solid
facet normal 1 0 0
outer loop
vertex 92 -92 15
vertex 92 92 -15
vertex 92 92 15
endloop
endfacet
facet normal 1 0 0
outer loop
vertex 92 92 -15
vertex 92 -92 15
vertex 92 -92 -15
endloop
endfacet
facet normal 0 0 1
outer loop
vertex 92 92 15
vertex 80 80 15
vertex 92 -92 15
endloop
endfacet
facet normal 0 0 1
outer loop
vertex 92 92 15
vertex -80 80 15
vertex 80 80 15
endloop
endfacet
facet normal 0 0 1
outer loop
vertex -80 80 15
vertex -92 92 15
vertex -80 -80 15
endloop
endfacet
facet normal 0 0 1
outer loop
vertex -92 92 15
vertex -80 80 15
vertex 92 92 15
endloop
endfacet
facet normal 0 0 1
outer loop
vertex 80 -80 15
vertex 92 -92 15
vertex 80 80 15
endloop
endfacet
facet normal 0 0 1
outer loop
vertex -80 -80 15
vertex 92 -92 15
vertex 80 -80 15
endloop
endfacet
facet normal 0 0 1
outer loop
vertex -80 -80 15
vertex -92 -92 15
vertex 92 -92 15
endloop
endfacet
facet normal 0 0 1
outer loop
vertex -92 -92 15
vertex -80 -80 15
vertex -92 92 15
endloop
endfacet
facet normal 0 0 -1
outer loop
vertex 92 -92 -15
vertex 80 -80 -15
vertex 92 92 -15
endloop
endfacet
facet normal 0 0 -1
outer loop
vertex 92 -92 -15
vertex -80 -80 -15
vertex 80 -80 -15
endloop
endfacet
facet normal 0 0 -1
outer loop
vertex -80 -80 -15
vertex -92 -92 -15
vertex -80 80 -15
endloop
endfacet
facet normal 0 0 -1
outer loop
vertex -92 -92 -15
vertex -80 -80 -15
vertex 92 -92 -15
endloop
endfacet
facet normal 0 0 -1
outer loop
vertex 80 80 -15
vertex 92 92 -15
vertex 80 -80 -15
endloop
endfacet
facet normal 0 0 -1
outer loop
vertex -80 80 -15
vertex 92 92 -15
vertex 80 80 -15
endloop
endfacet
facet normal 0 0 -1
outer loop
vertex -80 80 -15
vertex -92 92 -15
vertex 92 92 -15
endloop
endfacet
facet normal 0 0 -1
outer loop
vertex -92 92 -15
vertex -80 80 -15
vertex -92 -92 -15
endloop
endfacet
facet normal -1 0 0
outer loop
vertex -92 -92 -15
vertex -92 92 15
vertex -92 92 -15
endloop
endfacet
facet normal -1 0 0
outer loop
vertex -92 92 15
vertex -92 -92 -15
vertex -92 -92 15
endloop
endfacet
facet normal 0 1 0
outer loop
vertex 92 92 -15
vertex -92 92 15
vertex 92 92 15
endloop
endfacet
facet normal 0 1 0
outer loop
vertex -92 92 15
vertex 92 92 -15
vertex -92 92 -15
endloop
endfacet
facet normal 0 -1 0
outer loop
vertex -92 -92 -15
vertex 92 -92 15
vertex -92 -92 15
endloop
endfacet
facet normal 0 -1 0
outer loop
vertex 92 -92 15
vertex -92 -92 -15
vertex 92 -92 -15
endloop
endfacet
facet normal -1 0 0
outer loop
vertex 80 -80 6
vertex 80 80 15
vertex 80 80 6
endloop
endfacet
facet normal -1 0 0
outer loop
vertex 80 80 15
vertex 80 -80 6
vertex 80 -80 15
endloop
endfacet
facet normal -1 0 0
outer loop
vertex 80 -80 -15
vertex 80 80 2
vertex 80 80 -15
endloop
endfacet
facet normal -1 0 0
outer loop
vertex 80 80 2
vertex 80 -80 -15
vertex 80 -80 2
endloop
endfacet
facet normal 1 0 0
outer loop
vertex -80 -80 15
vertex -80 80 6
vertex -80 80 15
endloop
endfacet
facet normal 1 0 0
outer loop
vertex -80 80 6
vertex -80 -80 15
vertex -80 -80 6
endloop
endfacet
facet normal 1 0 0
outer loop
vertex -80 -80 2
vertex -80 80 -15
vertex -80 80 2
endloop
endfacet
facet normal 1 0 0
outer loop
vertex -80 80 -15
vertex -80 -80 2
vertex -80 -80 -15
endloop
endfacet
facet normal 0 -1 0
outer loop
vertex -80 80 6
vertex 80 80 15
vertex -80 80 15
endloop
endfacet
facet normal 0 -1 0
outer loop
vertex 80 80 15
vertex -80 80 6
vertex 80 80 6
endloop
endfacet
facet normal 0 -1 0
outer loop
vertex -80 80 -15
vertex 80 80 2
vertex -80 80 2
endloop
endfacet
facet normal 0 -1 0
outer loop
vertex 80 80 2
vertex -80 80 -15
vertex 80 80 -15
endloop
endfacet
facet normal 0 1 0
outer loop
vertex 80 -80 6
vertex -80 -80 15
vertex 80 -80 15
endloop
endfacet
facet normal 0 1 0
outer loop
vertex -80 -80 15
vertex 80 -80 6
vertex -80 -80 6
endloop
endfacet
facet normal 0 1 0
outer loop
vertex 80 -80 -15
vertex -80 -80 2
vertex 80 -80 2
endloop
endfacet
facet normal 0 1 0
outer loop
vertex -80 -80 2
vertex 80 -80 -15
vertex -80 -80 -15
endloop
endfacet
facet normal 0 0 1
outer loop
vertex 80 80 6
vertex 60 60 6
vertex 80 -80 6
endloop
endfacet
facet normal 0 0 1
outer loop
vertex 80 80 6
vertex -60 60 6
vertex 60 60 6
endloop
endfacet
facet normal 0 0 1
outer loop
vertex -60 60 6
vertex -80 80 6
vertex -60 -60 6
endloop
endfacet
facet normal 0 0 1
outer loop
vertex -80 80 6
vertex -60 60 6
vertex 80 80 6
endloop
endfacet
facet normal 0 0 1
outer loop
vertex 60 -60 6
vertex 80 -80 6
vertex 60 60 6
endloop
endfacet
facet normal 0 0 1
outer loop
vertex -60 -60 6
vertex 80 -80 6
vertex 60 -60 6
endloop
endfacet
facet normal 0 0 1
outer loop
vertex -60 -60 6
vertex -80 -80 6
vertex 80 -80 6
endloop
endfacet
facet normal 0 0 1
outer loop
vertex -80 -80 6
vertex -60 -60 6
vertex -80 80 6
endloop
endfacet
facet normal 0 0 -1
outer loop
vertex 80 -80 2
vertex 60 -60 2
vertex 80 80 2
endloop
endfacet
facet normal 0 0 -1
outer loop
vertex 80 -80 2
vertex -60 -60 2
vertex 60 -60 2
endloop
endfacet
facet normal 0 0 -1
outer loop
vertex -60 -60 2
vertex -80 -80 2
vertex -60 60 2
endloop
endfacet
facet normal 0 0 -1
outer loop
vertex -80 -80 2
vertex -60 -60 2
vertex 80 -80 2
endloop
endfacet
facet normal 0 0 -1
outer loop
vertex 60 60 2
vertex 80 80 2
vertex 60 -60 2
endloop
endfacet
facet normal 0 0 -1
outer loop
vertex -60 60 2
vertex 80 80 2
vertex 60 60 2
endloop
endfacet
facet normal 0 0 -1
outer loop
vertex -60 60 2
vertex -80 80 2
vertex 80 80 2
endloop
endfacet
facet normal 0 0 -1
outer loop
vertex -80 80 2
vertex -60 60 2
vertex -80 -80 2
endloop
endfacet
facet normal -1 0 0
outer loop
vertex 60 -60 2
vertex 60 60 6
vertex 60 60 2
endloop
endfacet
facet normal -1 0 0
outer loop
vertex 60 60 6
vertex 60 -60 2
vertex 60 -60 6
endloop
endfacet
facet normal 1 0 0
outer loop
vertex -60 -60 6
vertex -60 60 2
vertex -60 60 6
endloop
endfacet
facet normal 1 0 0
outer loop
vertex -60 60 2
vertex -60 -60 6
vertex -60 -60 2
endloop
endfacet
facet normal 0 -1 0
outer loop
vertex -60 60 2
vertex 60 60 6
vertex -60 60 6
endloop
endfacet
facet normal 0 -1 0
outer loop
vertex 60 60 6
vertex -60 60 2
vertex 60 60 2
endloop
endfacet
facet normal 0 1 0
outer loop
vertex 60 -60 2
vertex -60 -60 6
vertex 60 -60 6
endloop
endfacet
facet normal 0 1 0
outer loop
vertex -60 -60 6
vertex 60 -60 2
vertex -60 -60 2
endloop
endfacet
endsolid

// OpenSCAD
// file: frame.scad
$fa = 1;
$fs = 0.04;

e = 0.01;

module external_form(outer_dimension, inner_dimension, height) {
    difference() {
        // Main external form
        cube([outer_dimension, outer_dimension, height], center=true);

        // Inner cutout
        cube([inner_dimension, inner_dimension, height + e], center=true);
    }
}

module lens_board_back(outer_dimension, inner_dimension, height) {
    difference() {
        cube([outer_dimension + e, outer_dimension + e, height], center=true);
        cube([inner_dimension, inner_dimension, height +  e], center=true);
    }
}

module frame(outer_dimension, cutout_length) {
    lens_board_thickness = 4;
    outer_thickness = 12;
    inner_dimension = outer_dimension - (2 * outer_thickness);
    height = 30;

    union () {
        external_form(outer_dimension, inner_dimension, height);

        translate([0, 0, lens_board_thickness])
            lens_board_back(inner_dimension, cutout_length, lens_board_thickness);

    }
}
// main file
$fa = 1;
$fs = 0.04;

e = 0.01;

use <frame.scad>

frame(outer_dimension=184, cutout_length=120);
